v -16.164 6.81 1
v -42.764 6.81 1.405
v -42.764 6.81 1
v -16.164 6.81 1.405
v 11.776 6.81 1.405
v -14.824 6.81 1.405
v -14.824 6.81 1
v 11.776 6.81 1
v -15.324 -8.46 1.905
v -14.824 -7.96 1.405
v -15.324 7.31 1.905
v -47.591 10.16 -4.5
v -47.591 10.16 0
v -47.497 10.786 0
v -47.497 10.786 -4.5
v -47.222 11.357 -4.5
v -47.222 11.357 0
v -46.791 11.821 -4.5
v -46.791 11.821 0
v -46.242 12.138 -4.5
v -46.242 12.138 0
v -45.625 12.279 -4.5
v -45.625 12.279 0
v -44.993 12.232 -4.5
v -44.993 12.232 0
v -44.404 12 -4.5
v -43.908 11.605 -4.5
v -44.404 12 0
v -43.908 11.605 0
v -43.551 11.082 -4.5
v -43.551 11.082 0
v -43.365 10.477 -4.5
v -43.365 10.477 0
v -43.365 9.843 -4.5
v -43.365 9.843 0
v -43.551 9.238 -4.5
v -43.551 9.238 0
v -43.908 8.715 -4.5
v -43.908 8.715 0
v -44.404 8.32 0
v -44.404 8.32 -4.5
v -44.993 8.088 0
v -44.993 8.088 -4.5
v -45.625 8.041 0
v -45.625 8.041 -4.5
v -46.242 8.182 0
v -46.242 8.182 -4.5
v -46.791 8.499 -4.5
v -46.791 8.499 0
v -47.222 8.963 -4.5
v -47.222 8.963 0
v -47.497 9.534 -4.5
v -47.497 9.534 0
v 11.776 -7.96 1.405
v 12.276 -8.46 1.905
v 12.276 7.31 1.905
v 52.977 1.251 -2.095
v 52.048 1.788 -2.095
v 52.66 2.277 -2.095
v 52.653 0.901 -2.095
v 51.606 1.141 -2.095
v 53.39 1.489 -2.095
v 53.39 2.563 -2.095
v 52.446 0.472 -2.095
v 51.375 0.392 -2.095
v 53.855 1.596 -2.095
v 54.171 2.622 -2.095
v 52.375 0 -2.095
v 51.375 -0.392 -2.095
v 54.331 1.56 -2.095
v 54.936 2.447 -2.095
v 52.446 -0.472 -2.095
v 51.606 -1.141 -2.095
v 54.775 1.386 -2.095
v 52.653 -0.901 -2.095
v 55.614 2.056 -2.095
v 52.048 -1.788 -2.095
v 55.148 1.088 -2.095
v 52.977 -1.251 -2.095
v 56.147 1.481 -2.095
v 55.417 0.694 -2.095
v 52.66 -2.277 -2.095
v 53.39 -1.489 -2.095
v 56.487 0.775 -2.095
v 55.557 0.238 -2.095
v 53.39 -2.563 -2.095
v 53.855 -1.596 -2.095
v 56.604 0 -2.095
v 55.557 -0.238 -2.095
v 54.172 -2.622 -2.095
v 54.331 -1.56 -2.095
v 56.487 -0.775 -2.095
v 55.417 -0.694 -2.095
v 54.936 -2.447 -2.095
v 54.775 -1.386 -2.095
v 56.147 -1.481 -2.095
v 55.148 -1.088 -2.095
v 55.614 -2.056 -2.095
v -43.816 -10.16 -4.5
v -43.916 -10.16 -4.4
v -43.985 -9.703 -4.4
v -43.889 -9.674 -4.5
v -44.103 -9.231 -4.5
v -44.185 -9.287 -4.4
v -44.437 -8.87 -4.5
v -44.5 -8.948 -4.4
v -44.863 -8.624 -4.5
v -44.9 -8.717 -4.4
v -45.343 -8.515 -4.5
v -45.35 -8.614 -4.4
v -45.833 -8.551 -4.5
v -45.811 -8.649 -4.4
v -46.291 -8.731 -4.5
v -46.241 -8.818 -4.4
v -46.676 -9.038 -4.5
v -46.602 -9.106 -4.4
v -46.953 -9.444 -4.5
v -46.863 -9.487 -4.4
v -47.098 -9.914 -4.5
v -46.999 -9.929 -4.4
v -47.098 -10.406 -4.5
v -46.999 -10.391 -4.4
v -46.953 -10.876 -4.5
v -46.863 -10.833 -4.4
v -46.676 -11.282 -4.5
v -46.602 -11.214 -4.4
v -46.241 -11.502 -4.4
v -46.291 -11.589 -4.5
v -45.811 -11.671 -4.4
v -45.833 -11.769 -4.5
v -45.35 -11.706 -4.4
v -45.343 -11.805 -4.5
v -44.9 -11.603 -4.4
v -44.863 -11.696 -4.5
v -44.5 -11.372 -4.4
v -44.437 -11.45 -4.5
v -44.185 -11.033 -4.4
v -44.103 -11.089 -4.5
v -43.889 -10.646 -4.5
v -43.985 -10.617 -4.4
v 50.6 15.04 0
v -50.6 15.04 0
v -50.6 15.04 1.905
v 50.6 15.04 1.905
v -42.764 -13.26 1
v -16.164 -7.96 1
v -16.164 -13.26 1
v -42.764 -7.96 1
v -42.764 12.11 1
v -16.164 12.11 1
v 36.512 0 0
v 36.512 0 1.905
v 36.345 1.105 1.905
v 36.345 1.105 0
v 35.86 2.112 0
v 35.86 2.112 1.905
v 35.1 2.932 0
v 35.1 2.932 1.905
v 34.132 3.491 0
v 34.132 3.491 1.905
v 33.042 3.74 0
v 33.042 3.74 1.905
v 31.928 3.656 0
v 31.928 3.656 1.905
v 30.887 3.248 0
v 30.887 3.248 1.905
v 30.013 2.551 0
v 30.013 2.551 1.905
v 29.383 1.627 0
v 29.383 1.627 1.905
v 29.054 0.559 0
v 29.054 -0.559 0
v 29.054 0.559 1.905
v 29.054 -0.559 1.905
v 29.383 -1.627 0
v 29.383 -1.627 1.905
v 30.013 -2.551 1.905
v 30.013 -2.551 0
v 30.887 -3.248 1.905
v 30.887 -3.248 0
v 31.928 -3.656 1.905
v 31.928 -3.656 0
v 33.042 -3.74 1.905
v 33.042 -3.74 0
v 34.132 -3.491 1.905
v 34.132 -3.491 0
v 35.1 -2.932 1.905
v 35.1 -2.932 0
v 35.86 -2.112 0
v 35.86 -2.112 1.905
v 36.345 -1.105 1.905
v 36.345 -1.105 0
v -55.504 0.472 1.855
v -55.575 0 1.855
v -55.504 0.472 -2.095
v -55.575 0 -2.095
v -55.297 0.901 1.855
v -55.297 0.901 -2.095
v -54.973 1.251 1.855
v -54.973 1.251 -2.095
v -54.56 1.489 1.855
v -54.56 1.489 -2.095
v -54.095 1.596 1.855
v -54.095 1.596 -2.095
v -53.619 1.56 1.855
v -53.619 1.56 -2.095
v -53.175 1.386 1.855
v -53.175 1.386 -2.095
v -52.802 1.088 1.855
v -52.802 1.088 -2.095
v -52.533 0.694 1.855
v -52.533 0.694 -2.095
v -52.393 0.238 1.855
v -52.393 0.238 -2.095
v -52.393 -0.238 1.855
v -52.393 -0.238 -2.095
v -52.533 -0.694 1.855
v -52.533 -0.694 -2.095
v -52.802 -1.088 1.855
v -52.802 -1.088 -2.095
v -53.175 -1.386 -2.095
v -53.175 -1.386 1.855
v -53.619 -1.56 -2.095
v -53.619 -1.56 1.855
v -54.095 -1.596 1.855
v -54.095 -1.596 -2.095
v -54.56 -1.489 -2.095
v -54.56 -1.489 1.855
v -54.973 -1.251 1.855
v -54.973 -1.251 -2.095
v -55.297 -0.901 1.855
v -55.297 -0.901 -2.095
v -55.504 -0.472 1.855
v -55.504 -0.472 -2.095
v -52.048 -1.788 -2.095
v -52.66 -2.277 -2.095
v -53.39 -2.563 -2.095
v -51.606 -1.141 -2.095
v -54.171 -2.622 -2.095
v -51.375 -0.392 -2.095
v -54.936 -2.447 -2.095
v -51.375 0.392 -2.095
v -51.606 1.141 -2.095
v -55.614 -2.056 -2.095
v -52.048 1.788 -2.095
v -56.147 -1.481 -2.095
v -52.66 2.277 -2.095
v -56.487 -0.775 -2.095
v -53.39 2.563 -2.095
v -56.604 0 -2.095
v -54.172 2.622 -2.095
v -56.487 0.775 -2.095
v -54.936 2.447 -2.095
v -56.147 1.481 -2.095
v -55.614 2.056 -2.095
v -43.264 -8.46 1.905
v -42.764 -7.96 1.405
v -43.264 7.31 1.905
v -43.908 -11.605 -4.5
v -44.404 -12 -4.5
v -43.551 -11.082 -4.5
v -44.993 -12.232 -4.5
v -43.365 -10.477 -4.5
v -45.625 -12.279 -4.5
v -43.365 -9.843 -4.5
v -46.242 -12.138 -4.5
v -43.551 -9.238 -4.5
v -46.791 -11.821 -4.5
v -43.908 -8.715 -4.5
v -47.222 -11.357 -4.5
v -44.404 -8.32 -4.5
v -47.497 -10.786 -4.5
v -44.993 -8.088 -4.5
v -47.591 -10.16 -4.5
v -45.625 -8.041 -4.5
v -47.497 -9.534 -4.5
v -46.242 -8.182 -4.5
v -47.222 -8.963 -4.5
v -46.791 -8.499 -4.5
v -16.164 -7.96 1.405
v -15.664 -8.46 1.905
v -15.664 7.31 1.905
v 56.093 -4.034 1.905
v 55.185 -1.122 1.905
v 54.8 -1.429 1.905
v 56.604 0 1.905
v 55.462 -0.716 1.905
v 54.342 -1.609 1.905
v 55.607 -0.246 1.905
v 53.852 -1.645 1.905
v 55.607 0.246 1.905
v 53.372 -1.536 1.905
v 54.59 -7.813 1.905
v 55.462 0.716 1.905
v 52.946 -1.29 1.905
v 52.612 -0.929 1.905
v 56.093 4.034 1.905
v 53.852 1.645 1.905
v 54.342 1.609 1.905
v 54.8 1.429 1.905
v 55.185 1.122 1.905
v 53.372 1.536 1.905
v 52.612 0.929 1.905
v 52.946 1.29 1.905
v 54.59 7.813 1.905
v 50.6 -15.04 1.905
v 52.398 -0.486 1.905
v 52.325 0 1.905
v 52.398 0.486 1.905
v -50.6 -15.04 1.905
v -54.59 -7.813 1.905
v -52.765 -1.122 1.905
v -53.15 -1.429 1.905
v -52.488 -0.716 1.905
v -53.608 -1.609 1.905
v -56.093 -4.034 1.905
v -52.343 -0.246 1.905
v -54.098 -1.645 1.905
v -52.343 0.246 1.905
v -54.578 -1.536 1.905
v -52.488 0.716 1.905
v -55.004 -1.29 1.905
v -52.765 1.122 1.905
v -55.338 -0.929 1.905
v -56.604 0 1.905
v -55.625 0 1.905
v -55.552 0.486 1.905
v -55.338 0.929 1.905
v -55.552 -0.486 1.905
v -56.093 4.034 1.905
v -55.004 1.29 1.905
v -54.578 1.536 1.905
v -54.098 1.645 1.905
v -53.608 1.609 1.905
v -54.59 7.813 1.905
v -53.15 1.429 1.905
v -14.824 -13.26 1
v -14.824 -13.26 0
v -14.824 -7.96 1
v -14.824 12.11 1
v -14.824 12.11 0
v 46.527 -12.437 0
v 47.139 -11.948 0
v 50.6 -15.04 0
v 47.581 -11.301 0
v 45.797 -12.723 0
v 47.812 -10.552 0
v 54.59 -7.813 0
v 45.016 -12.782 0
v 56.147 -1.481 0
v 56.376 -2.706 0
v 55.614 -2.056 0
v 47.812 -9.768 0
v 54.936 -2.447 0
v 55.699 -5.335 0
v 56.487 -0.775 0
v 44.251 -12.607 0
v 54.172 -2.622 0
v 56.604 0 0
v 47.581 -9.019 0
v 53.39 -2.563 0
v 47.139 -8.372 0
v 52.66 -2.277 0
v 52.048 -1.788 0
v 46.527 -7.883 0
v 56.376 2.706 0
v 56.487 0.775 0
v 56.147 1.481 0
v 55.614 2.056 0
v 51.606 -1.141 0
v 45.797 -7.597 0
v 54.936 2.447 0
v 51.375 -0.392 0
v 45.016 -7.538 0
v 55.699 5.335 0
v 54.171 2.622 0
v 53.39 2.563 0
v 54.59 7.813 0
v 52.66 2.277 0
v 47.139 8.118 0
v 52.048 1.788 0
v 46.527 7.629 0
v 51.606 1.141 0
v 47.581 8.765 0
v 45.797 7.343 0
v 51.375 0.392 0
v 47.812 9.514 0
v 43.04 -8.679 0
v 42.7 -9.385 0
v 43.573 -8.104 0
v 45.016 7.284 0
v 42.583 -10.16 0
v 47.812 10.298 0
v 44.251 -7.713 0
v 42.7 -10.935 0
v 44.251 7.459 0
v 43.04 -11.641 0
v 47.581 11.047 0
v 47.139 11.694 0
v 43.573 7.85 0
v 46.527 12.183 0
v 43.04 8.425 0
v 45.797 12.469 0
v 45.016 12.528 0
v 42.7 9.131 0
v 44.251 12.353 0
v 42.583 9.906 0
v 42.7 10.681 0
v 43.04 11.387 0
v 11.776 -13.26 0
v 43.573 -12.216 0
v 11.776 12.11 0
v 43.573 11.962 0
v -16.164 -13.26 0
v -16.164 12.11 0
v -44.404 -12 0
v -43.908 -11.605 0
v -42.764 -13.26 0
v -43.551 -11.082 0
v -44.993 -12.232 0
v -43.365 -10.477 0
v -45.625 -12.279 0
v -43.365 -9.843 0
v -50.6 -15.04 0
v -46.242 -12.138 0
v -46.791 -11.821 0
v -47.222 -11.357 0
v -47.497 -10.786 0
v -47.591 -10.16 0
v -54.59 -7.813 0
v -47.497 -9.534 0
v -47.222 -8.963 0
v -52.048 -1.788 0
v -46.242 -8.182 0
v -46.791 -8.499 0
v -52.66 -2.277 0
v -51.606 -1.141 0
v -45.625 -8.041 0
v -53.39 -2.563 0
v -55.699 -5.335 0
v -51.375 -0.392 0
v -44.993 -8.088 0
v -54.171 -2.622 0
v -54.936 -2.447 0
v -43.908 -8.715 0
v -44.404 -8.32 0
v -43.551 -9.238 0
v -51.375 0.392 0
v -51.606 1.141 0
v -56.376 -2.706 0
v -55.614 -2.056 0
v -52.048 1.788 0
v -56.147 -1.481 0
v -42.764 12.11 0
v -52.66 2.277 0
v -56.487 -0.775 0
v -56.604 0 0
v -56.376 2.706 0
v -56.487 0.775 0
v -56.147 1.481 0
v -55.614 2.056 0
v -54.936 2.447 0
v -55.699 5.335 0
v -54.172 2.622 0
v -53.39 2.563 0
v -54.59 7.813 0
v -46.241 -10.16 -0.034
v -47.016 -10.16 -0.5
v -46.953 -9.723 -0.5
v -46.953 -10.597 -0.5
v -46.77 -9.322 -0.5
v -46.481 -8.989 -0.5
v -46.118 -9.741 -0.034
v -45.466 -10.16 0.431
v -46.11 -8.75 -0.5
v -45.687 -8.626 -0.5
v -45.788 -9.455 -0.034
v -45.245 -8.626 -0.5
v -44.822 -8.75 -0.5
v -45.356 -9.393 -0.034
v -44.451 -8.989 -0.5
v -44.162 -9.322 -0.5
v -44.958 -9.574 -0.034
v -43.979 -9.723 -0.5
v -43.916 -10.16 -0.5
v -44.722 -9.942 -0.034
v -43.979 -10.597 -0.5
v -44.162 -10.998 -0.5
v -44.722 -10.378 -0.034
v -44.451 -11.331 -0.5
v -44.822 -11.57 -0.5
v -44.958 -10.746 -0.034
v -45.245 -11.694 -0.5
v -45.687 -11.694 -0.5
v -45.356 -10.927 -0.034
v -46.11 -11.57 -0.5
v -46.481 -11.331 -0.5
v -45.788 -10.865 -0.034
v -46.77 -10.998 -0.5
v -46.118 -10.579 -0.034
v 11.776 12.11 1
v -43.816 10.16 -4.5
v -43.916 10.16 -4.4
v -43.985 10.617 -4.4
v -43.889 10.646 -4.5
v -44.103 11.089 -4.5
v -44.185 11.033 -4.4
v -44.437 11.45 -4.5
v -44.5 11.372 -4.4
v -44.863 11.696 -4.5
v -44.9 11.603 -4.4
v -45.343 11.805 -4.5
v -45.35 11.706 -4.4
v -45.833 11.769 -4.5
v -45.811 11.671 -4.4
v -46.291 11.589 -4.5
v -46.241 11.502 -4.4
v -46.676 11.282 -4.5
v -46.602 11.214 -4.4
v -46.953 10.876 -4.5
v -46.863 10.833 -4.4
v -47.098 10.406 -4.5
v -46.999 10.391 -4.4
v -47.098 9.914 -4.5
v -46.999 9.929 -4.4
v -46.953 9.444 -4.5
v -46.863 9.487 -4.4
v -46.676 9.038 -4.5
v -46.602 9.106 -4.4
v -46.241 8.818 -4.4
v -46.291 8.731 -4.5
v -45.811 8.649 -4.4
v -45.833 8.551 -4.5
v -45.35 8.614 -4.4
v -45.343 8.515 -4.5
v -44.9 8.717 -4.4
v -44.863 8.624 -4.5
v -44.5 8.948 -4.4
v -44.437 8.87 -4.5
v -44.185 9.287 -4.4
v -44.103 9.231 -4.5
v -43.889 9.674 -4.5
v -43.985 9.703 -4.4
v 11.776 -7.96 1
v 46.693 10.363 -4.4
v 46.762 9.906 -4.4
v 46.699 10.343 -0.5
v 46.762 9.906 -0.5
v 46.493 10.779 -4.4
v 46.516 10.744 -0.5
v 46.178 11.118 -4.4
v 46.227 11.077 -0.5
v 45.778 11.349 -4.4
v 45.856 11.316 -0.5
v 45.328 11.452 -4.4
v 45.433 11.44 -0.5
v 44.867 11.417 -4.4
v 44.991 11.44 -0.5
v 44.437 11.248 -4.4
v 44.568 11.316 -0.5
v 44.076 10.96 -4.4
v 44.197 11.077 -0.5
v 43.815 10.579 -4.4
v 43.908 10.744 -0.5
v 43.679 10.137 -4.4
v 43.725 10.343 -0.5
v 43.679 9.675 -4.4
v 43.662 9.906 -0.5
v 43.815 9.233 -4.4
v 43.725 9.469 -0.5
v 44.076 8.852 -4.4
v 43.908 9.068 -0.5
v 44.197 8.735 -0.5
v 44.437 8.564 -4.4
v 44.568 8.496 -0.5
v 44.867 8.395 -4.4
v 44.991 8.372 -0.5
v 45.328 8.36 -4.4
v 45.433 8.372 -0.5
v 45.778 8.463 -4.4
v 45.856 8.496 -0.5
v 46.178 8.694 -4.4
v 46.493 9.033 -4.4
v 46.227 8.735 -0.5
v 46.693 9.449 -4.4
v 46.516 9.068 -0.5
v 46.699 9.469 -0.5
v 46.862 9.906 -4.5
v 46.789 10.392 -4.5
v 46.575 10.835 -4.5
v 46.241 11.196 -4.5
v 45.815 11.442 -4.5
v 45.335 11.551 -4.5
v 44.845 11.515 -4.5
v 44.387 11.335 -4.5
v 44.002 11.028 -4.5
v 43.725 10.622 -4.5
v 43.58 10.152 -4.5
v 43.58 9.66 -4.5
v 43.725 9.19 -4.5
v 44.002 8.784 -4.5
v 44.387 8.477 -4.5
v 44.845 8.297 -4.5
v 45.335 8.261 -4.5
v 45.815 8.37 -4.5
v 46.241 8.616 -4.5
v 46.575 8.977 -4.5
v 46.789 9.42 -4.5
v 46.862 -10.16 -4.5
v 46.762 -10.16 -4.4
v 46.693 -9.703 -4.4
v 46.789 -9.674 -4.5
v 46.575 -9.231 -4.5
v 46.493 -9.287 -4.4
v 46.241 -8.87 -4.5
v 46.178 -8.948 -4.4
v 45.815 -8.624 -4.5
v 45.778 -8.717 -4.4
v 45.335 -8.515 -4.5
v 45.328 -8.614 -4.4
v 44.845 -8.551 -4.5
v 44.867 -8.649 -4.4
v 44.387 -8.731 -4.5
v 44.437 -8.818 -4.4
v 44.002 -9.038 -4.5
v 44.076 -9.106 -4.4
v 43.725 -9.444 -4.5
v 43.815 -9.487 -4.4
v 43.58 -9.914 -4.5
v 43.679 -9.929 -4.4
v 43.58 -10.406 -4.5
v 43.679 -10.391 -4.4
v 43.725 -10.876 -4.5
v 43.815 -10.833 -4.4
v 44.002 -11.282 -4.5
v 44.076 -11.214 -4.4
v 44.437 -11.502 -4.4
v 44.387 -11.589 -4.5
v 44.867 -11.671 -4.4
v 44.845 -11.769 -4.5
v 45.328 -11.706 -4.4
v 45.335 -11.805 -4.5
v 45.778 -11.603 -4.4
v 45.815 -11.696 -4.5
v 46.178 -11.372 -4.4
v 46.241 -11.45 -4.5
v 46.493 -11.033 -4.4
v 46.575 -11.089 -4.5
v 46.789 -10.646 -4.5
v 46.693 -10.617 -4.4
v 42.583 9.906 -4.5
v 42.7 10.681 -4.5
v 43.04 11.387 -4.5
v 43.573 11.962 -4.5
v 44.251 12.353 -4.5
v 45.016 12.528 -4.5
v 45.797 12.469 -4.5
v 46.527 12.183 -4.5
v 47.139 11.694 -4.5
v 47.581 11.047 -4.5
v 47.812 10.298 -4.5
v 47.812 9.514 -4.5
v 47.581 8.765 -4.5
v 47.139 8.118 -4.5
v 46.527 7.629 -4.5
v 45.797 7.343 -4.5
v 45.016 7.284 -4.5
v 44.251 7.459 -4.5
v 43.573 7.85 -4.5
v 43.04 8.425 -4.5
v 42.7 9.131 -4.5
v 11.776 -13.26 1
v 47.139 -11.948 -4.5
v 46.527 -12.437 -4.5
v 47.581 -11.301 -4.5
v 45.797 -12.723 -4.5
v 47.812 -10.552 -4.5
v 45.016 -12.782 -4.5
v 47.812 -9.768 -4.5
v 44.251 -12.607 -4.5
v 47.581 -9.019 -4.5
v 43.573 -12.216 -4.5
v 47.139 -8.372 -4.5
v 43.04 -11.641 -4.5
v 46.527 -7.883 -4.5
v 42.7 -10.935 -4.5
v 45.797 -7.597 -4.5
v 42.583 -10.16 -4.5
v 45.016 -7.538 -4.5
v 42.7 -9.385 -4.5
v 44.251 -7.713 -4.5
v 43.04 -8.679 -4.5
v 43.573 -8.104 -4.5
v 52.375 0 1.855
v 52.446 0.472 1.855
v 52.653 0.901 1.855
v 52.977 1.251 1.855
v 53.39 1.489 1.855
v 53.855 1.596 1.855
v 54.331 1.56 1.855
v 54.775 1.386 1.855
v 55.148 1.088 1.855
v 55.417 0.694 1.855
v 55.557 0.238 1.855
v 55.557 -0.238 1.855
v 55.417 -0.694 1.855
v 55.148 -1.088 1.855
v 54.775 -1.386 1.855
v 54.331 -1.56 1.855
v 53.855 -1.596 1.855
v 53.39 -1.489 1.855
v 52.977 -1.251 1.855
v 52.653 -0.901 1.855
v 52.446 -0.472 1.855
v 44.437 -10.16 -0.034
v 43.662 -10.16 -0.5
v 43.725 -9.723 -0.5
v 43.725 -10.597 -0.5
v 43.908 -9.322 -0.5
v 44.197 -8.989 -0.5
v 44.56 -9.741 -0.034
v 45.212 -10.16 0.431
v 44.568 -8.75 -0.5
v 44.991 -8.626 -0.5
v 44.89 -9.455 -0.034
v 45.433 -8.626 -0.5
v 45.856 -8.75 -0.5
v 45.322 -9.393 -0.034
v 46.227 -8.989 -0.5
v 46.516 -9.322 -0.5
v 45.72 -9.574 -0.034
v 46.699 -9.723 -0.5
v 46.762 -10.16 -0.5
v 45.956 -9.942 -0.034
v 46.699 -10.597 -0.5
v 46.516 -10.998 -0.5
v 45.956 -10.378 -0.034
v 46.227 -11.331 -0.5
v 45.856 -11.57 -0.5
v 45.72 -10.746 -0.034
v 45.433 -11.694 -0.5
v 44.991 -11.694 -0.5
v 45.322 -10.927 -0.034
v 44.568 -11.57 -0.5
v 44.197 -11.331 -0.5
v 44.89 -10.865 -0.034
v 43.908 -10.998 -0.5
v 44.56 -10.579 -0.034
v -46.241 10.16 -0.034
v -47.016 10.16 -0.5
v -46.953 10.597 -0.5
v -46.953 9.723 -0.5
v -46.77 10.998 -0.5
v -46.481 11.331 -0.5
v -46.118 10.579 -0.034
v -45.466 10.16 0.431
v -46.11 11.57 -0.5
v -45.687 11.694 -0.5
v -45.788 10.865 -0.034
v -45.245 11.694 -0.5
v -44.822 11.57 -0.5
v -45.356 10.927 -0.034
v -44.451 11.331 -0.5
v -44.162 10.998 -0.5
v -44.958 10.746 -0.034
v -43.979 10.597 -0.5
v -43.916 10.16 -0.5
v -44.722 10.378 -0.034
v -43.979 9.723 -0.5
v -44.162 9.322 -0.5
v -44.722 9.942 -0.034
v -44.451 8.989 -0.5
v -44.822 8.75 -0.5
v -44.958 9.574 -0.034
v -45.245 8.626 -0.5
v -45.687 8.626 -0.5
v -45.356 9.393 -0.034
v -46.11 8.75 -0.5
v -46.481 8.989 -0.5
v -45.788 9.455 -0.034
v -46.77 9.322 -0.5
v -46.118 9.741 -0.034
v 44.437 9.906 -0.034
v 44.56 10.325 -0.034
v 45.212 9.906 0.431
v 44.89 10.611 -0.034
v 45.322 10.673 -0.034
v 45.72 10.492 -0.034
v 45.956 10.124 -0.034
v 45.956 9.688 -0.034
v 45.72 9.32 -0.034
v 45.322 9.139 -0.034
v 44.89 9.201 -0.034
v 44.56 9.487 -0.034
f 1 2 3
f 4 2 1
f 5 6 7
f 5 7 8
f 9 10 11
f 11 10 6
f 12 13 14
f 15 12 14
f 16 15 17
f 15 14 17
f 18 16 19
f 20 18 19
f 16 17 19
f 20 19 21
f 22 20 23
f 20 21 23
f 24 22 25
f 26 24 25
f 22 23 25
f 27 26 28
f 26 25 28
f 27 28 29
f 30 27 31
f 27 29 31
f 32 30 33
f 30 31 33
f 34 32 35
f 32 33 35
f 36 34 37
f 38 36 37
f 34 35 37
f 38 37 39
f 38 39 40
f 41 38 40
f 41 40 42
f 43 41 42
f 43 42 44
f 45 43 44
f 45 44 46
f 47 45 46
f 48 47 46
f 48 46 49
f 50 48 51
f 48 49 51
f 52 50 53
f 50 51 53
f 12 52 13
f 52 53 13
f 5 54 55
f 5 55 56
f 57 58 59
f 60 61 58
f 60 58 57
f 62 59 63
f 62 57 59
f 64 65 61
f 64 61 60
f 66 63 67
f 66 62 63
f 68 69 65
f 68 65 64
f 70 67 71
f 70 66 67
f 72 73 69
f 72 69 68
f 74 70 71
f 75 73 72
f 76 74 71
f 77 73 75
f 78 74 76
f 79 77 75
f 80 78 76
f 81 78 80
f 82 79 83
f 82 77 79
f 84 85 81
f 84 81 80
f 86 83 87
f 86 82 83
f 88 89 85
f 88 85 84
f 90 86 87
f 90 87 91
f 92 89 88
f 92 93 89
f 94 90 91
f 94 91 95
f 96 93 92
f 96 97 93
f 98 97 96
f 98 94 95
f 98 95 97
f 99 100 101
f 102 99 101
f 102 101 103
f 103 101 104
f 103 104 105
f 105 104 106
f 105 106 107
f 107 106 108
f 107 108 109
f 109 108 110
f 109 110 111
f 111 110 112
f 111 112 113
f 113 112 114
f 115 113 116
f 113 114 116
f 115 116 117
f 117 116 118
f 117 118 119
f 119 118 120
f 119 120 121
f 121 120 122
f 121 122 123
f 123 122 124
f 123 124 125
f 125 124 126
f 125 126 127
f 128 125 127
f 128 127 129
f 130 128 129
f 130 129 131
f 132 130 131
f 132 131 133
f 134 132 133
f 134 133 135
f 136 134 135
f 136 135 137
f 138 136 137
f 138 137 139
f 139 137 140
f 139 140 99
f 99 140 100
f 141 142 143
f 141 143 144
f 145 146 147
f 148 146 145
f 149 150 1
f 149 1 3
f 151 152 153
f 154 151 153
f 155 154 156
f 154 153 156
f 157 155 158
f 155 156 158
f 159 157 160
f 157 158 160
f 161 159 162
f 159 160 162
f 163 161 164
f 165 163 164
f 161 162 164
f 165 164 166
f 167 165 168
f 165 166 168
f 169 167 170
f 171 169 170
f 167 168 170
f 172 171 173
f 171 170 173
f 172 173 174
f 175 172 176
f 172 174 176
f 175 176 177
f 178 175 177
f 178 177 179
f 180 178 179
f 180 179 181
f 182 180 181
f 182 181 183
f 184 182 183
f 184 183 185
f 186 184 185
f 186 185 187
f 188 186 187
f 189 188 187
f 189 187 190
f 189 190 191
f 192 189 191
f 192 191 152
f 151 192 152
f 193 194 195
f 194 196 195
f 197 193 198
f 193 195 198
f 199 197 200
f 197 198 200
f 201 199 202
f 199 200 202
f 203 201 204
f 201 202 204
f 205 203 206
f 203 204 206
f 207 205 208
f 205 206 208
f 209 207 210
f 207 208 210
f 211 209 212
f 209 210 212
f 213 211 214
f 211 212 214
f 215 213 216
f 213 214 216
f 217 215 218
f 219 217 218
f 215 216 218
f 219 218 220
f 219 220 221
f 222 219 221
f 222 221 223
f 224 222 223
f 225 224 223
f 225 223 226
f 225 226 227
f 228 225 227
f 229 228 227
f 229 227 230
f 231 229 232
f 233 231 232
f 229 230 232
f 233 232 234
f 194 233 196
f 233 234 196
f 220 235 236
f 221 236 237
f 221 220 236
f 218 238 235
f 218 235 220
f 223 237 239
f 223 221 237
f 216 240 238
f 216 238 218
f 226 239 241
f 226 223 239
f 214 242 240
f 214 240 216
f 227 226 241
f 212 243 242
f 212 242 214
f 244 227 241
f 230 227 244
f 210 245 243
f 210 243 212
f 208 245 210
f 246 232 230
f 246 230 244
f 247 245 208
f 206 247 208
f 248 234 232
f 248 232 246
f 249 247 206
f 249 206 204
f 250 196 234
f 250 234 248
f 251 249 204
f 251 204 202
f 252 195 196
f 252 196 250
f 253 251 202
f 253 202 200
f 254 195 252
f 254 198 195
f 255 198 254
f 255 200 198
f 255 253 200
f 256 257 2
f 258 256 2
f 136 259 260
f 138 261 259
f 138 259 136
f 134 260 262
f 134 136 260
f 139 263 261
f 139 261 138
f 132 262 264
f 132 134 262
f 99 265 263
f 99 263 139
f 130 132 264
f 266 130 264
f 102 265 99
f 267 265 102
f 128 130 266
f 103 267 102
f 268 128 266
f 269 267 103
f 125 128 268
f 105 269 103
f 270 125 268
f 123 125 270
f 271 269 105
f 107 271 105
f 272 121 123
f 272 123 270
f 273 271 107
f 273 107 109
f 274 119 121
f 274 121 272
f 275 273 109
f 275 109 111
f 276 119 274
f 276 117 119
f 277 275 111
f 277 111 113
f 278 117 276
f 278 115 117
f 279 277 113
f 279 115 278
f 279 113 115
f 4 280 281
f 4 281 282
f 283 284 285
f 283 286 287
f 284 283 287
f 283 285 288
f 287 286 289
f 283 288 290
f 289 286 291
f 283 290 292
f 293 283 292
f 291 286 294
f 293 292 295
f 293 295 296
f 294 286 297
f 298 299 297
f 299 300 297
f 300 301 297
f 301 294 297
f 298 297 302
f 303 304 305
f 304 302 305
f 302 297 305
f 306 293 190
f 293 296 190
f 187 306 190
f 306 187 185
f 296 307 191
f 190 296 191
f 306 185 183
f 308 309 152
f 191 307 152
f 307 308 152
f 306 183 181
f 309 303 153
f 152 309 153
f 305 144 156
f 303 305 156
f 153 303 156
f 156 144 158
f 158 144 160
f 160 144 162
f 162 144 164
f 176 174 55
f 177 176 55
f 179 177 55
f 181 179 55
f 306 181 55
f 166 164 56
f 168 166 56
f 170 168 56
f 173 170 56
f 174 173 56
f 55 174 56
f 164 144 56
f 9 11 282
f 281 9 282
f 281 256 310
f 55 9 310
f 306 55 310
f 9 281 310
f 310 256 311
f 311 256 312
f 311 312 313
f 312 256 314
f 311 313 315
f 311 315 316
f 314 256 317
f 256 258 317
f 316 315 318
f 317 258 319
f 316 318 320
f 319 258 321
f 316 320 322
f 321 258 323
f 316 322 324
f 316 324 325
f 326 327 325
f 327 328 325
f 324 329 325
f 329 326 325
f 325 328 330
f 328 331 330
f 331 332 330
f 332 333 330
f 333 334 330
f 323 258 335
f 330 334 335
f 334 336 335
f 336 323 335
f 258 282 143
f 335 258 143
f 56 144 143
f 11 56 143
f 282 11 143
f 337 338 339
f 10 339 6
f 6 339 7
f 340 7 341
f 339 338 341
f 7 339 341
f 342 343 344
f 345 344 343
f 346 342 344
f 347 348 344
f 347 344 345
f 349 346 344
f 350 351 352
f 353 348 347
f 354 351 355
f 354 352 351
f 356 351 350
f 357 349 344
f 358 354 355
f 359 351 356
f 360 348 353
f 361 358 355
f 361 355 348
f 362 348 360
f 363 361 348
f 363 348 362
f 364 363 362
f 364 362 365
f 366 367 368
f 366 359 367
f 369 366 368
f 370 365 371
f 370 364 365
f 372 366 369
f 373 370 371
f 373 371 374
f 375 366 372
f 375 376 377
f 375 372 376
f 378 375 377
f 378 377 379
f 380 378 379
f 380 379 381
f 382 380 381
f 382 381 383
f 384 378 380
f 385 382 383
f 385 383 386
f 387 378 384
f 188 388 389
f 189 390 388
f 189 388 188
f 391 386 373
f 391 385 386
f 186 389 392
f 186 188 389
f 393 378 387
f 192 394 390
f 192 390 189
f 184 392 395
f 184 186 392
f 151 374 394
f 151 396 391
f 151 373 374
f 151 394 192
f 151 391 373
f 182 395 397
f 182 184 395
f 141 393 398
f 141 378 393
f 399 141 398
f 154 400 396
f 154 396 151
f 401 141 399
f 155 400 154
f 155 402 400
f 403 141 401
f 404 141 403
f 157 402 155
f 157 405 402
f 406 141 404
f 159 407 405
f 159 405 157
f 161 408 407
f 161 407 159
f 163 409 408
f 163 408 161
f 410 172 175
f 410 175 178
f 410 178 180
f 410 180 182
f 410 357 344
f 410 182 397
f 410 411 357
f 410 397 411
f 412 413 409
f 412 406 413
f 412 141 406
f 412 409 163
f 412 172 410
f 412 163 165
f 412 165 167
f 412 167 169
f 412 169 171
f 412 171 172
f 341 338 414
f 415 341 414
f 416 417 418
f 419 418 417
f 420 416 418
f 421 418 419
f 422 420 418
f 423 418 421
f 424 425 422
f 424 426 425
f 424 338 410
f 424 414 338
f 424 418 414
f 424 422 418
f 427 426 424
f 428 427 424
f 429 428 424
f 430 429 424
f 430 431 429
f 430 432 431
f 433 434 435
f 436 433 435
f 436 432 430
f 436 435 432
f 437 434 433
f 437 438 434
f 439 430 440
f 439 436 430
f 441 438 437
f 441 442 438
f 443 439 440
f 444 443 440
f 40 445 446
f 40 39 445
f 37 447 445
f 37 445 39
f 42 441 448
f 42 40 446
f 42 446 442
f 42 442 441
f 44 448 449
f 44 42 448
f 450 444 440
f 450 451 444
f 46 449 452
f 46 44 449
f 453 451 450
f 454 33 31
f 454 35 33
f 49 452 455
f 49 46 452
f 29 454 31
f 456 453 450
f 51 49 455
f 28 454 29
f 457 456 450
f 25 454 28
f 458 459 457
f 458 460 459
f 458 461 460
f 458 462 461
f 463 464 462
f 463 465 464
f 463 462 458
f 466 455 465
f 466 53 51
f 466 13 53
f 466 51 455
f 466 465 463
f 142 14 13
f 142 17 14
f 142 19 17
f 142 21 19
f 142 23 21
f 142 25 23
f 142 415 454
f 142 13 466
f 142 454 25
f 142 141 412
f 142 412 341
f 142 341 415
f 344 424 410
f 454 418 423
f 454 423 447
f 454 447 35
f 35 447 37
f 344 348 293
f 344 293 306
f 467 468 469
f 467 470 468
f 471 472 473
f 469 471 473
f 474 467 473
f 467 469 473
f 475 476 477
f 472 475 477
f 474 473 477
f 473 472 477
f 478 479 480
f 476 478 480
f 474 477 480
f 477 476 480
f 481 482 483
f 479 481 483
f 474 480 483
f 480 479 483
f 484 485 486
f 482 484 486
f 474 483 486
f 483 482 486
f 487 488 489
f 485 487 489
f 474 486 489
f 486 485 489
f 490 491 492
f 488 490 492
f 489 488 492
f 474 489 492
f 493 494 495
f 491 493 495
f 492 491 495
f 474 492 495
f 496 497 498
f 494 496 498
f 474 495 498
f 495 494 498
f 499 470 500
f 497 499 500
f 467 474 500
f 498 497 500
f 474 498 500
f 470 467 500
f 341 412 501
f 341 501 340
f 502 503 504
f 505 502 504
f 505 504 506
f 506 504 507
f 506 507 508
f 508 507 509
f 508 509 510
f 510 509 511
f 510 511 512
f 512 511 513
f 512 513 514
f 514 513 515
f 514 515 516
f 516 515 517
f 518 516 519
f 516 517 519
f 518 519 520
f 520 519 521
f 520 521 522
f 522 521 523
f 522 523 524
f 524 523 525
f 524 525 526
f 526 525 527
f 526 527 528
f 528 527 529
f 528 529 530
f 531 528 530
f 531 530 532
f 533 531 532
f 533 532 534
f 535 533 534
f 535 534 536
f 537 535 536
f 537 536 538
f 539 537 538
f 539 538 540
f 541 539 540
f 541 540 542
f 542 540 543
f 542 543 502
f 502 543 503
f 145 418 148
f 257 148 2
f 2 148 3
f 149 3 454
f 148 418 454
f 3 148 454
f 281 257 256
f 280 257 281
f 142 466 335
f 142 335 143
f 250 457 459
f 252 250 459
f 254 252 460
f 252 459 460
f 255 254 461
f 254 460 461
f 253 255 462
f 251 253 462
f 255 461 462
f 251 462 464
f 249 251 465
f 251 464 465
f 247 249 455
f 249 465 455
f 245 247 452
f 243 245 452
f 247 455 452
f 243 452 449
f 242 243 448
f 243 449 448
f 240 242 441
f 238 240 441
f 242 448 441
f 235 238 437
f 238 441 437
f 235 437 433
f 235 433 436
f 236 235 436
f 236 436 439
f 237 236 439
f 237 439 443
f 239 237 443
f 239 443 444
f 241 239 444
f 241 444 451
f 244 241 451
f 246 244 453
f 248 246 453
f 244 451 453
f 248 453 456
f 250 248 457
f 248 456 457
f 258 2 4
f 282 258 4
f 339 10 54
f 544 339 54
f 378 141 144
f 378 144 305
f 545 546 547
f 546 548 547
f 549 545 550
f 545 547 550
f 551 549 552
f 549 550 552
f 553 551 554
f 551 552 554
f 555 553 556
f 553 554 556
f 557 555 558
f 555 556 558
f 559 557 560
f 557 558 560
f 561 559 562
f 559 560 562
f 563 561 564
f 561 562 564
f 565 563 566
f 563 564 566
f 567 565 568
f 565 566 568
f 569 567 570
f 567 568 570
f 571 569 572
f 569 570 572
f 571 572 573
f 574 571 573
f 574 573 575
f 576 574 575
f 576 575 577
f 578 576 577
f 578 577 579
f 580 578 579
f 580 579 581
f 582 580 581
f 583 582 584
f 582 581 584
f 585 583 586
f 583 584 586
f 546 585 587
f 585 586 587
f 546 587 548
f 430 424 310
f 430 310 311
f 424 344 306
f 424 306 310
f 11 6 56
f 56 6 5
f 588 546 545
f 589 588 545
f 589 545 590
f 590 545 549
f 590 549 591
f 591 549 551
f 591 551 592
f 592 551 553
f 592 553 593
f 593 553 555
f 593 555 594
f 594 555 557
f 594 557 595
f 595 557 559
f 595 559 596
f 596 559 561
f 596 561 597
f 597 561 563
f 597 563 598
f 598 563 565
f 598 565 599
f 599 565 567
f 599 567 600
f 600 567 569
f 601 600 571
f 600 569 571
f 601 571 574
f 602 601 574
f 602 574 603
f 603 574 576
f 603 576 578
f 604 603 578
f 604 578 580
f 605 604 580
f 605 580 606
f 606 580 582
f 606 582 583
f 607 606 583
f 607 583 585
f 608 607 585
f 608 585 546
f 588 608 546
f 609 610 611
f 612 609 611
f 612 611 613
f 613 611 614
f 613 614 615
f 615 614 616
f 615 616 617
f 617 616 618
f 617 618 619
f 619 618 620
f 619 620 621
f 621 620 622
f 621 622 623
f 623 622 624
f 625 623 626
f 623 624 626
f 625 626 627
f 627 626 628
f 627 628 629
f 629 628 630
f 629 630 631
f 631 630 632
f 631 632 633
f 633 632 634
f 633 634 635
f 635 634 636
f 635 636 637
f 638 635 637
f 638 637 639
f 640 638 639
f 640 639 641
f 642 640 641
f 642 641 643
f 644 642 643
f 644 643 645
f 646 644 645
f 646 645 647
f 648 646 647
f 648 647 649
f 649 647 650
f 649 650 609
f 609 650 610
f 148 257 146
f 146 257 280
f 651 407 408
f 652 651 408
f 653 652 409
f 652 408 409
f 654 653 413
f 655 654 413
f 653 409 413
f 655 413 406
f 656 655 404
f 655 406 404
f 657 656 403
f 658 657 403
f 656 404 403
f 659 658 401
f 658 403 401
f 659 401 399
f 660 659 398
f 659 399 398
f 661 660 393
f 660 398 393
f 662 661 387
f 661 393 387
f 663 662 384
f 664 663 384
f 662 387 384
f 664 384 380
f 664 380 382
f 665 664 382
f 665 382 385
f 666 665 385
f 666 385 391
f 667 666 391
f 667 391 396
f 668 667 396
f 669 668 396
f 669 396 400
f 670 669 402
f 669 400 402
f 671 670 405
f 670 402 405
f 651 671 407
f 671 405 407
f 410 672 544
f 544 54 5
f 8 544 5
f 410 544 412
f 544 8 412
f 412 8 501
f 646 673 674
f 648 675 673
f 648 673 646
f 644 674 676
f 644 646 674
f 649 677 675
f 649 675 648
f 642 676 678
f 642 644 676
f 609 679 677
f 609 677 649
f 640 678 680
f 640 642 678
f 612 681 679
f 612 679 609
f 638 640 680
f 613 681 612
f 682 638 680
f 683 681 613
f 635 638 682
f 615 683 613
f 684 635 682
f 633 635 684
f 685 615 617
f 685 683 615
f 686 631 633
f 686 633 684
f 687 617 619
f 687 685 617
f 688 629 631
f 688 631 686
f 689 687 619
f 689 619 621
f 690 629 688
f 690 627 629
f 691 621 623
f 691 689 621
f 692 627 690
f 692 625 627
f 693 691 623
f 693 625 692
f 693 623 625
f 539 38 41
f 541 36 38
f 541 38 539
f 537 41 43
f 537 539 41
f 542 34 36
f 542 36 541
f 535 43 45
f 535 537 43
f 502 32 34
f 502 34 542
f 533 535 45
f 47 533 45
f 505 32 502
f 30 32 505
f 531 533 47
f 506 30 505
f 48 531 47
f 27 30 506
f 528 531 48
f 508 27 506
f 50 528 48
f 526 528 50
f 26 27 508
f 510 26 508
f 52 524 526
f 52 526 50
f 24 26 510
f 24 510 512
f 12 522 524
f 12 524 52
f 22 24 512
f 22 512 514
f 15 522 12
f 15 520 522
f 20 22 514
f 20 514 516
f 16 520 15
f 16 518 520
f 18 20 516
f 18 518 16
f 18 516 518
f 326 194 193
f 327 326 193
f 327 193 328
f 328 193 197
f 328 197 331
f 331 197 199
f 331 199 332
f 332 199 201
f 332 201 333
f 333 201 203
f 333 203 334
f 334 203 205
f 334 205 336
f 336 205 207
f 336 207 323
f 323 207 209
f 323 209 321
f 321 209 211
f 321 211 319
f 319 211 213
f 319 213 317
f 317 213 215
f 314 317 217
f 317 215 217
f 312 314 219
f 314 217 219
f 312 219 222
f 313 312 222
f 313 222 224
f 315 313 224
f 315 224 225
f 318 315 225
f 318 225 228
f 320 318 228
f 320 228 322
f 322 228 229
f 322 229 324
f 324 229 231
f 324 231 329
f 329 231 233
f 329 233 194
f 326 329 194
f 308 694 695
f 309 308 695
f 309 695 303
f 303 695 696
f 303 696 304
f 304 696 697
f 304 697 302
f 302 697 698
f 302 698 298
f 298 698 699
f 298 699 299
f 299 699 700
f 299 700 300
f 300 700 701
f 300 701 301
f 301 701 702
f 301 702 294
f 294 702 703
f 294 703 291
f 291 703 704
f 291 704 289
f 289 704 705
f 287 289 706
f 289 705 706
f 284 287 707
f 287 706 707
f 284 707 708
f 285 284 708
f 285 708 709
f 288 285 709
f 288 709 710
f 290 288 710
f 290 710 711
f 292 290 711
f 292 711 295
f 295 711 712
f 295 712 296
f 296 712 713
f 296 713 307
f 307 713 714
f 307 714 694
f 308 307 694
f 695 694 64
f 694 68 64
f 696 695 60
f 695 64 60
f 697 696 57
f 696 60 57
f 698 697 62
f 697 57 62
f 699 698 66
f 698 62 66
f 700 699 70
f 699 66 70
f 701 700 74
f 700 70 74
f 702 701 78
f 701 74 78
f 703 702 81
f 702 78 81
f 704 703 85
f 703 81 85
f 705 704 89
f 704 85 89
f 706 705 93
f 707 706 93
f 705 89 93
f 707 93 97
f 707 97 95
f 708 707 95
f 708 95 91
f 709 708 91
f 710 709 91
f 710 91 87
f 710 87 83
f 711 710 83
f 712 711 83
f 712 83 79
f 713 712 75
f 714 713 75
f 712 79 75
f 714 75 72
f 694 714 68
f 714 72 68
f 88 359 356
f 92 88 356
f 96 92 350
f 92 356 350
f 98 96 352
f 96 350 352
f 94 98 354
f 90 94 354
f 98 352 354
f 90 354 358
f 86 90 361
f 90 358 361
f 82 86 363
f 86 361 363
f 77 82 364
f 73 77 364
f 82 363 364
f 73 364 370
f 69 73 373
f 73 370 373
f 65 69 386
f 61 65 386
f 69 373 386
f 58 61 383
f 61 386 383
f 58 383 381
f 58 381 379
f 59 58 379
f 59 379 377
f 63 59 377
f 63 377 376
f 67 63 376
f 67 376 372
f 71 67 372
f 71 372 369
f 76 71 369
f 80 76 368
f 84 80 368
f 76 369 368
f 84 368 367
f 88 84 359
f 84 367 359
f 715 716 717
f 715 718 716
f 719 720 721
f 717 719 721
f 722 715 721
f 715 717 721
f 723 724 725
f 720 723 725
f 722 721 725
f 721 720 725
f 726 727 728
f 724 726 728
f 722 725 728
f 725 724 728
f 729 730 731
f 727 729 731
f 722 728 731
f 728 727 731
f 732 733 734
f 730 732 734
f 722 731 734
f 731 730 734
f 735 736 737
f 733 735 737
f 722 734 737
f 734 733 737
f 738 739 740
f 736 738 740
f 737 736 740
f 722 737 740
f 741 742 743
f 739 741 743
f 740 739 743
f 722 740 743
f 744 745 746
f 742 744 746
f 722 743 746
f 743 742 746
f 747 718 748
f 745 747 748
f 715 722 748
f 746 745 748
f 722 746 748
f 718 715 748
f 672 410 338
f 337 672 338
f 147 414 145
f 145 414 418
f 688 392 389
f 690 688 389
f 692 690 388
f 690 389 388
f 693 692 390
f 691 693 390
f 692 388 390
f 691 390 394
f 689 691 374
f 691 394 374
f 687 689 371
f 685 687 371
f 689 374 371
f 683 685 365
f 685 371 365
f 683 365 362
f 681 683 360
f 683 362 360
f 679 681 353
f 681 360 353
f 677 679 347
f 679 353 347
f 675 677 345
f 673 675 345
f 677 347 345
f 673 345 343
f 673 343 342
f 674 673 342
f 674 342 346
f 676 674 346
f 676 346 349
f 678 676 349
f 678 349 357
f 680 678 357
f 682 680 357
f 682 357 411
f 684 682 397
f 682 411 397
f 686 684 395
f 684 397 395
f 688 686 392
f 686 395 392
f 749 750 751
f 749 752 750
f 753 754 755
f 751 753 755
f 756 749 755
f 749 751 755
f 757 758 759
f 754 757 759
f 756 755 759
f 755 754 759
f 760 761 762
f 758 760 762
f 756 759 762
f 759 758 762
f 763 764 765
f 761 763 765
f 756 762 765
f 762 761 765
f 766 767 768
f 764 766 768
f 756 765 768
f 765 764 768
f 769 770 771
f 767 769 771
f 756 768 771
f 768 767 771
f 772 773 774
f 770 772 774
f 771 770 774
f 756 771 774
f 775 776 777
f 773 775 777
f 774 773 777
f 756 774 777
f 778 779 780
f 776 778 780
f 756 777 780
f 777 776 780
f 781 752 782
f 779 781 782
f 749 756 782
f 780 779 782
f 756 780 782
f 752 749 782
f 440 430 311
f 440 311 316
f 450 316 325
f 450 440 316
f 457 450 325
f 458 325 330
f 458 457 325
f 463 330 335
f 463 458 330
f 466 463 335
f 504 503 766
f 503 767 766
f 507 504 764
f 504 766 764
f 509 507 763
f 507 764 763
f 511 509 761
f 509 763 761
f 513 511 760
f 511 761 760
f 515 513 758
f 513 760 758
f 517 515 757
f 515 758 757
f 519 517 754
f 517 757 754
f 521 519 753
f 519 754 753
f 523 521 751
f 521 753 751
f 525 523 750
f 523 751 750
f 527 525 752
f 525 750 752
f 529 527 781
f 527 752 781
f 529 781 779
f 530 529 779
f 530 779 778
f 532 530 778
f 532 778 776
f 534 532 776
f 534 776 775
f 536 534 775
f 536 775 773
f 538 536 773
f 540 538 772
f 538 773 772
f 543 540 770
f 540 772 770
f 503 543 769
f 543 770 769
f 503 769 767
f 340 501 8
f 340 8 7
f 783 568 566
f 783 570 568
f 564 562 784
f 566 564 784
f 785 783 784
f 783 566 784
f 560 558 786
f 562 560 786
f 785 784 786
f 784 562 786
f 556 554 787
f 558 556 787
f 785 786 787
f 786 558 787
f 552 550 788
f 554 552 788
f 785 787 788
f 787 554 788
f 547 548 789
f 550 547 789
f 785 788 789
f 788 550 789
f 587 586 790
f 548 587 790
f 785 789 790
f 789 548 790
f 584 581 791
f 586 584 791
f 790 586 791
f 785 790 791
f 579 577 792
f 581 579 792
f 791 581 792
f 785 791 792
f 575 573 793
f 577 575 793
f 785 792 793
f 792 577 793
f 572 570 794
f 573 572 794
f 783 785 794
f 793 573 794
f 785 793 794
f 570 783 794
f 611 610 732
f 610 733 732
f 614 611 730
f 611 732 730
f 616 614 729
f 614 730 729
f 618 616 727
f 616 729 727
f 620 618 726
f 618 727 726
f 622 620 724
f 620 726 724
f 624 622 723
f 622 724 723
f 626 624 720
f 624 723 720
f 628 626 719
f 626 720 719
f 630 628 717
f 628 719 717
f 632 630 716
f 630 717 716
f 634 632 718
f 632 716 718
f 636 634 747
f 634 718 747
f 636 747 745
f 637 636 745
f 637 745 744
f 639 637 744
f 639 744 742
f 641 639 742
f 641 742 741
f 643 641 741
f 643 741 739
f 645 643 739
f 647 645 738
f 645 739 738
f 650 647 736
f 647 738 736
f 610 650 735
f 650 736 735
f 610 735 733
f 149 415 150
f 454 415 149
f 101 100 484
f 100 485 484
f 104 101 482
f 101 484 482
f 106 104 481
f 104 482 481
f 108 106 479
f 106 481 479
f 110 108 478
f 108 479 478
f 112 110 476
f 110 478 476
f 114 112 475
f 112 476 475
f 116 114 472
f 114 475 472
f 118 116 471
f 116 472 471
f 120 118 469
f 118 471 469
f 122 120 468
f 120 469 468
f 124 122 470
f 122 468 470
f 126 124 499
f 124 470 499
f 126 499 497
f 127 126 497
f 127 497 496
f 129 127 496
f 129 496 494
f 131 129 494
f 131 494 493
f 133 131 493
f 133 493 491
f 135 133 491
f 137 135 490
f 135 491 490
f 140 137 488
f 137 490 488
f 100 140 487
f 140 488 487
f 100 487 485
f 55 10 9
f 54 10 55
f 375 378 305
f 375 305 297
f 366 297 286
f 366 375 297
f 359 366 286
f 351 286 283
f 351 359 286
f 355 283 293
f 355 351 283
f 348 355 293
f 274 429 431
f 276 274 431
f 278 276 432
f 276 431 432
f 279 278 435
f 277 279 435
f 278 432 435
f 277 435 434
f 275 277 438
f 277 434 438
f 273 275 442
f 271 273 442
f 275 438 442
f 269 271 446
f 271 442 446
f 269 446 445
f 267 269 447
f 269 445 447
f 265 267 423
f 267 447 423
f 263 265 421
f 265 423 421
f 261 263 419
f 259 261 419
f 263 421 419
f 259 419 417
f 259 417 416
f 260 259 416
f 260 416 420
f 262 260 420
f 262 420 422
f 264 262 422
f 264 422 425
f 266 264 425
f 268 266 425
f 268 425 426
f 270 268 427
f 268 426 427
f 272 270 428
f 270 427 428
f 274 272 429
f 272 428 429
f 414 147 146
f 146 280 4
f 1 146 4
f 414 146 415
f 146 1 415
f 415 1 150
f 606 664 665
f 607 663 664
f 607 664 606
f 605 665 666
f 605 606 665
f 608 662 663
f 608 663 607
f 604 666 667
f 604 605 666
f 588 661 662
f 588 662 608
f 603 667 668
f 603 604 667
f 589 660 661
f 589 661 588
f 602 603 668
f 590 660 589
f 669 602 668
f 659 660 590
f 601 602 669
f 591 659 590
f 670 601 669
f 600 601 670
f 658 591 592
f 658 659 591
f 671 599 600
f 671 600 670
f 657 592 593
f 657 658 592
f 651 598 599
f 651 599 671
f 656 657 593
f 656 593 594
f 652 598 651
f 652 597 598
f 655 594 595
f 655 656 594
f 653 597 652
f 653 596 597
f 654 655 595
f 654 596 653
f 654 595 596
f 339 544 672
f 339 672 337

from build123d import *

# Parameters (mm, degrees)
BOSS_EXTRUDE1_DEPTH             = 1.905
SKETCH6_R                       = 2.629225159
BOSS_EXTRUDE4_DEPTH             = 2.095
F_3_0MM_DOWEL_HOLE1_D           = 3.2
F_3_0MM_DOWEL_HOLE1_CSINK_D     = 3.3
F_3_0MM_DOWEL_HOLE1_CSINK_ANGLE = 90
SKETCH7_R                       = 3.75
SKETCH7_W                       = 26.6
SKETCH7_H                       = 14.7701
CUT_EXTRUDE1_DEPTH              = 59.70468385
SKETCH9_R                       = 2.629225159
SKETCH9_R_2                     = 2.125
BOSS_EXTRUDE5_DEPTH             = 4.5
F_3_0MM_DOWEL_HOLE2_D           = 3.1
F_3_0MM_DOWEL_HOLE2_DEPTH       = 4
F_3_0MM_DOWEL_HOLE2_CSINK_D     = 3.3
F_3_0MM_DOWEL_HOLE2_CSINK_ANGLE = 90
F_3_0MM_DOWEL_HOLE2_TIP         = 0.931333959
SKETCH12_W                      = 26.6
SKETCH12_H                      = 25.3701
CUT_EXTRUDE2_DEPTH              = 1
CHAMFER1_SIZE                   = 0.5


with BuildPart() as part:
    # Sketch1 → Boss-Extrude1 (new body)
    with BuildSketch(Plane.XY):
        with BuildLine():
            Line((-50.6, 15.04), (50.6, 15.04))
            Line((50.6, 15.04), (54.590317598, 7.813493896))
            ThreePointArc((54.590317598, 7.813493896), (56.604225159, 0), (54.590317598, -7.813493896))
            Line((54.590317598, -7.813493896), (50.6, -15.04))
            Line((50.6, -15.04), (-50.6, -15.04))
            Line((-50.6, -15.04), (-54.590317598, -7.813493896))
            ThreePointArc((-54.590317598, -7.813493896), (-56.604225159, 0), (-54.590317598, 7.813493896))
            Line((-54.590317598, 7.813493896), (-50.6, 15.04))
        make_face()
    extrude(amount=BOSS_EXTRUDE1_DEPTH)

    # Sketch6 → Boss-Extrude4 (add)
    with BuildSketch(Plane(origin=(0, 0, 0), x_dir=(-1, 0, 0), z_dir=(0, 0, -1))):
        with Locations(Location((-53.975, 0, 0), (0, 0, 179.99945392))):
            Circle(SKETCH6_R)
        with Locations(Location((53.975, 0, 0), (0, 0, 359.99945398))):
            Circle(SKETCH6_R)
    extrude(amount=BOSS_EXTRUDE4_DEPTH)

    # Ø3.0mm Dowel Hole1 (through all)
    with Locations(Plane.XY.offset(1.905)):
        with Locations((53.975, 0), (-53.975, 0)):
            CounterSinkHole(F_3_0MM_DOWEL_HOLE1_D / 2, F_3_0MM_DOWEL_HOLE1_CSINK_D / 2, counter_sink_angle=F_3_0MM_DOWEL_HOLE1_CSINK_ANGLE)

    # Sketch7 → Cut-Extrude1 (cut, through all)
    with BuildSketch(Plane.XY.offset(1.905)):
        with Locations((32.762, 0)):
            Circle(SKETCH7_R)
        with Locations((-29.464, -0.57505)):
            Rectangle(SKETCH7_W, SKETCH7_H)
        with Locations((-1.524, -0.57505)):
            Rectangle(SKETCH7_W, SKETCH7_H)
    extrude(amount=-CUT_EXTRUDE1_DEPTH, mode=Mode.SUBTRACT)

    # Sketch9 → Boss-Extrude5 (add)
    with BuildSketch(Plane(origin=(0, 0, 0), x_dir=(-1, 0, 0), z_dir=(0, 0, -1))):
        with Locations((-45.212, 9.906)):
            Circle(SKETCH9_R)
        with Locations((-45.212, -10.16)):
            Circle(SKETCH9_R)
        with Locations((45.466, -10.16)):
            Circle(SKETCH9_R_2)
        with Locations((45.466, 10.16)):
            Circle(SKETCH9_R_2)
    extrude(amount=BOSS_EXTRUDE5_DEPTH)

    # Ø3.0mm Dowel Hole2
    with Locations(Plane(origin=(0, 0, -4.5), x_dir=(-1, 0, 0), z_dir=(0, 0, -1))):
        with Locations((-45.212, 9.906), (-45.212, -10.16), (45.466, -10.16), (45.466, 10.16)):
            CounterSinkHole(F_3_0MM_DOWEL_HOLE2_D / 2, F_3_0MM_DOWEL_HOLE2_CSINK_D / 2, depth=F_3_0MM_DOWEL_HOLE2_DEPTH, counter_sink_angle=F_3_0MM_DOWEL_HOLE2_CSINK_ANGLE)
            with Locations((0, 0, -(F_3_0MM_DOWEL_HOLE2_DEPTH + F_3_0MM_DOWEL_HOLE2_TIP / 2))):  # 118° drill point
                Cone(0, F_3_0MM_DOWEL_HOLE2_D / 2, F_3_0MM_DOWEL_HOLE2_TIP, mode=Mode.SUBTRACT)

    # Sketch12 → Cut-Extrude2 (cut)
    with BuildSketch(Plane(origin=(0, 0, 0), x_dir=(-1, 0, 0), z_dir=(0, 0, -1))):
        with Locations((1.524, -0.57505)):
            Rectangle(SKETCH12_W, SKETCH12_H)
        with Locations((29.464, -0.57505)):
            Rectangle(SKETCH12_W, SKETCH12_H)
    extrude(amount=-CUT_EXTRUDE2_DEPTH, mode=Mode.SUBTRACT)

    # Chamfer1
    chamfer1_edges = [part.edges().sort_by_distance(p)[0] for p in [
        (-42.764, -0.57505, 1.905),
        (-29.464, -7.9601, 1.905),
        (-16.164, -0.57505, 1.905),
        (-29.464, 6.81, 1.905),
        (-14.824, -0.57505, 1.905),
        (-1.524, -7.9601, 1.905),
        (11.776, -0.57505, 1.905),
        (-1.524, 6.81, 1.905),
    ]]
    chamfer(chamfer1_edges, length=CHAMFER1_SIZE)


solid = part.part
